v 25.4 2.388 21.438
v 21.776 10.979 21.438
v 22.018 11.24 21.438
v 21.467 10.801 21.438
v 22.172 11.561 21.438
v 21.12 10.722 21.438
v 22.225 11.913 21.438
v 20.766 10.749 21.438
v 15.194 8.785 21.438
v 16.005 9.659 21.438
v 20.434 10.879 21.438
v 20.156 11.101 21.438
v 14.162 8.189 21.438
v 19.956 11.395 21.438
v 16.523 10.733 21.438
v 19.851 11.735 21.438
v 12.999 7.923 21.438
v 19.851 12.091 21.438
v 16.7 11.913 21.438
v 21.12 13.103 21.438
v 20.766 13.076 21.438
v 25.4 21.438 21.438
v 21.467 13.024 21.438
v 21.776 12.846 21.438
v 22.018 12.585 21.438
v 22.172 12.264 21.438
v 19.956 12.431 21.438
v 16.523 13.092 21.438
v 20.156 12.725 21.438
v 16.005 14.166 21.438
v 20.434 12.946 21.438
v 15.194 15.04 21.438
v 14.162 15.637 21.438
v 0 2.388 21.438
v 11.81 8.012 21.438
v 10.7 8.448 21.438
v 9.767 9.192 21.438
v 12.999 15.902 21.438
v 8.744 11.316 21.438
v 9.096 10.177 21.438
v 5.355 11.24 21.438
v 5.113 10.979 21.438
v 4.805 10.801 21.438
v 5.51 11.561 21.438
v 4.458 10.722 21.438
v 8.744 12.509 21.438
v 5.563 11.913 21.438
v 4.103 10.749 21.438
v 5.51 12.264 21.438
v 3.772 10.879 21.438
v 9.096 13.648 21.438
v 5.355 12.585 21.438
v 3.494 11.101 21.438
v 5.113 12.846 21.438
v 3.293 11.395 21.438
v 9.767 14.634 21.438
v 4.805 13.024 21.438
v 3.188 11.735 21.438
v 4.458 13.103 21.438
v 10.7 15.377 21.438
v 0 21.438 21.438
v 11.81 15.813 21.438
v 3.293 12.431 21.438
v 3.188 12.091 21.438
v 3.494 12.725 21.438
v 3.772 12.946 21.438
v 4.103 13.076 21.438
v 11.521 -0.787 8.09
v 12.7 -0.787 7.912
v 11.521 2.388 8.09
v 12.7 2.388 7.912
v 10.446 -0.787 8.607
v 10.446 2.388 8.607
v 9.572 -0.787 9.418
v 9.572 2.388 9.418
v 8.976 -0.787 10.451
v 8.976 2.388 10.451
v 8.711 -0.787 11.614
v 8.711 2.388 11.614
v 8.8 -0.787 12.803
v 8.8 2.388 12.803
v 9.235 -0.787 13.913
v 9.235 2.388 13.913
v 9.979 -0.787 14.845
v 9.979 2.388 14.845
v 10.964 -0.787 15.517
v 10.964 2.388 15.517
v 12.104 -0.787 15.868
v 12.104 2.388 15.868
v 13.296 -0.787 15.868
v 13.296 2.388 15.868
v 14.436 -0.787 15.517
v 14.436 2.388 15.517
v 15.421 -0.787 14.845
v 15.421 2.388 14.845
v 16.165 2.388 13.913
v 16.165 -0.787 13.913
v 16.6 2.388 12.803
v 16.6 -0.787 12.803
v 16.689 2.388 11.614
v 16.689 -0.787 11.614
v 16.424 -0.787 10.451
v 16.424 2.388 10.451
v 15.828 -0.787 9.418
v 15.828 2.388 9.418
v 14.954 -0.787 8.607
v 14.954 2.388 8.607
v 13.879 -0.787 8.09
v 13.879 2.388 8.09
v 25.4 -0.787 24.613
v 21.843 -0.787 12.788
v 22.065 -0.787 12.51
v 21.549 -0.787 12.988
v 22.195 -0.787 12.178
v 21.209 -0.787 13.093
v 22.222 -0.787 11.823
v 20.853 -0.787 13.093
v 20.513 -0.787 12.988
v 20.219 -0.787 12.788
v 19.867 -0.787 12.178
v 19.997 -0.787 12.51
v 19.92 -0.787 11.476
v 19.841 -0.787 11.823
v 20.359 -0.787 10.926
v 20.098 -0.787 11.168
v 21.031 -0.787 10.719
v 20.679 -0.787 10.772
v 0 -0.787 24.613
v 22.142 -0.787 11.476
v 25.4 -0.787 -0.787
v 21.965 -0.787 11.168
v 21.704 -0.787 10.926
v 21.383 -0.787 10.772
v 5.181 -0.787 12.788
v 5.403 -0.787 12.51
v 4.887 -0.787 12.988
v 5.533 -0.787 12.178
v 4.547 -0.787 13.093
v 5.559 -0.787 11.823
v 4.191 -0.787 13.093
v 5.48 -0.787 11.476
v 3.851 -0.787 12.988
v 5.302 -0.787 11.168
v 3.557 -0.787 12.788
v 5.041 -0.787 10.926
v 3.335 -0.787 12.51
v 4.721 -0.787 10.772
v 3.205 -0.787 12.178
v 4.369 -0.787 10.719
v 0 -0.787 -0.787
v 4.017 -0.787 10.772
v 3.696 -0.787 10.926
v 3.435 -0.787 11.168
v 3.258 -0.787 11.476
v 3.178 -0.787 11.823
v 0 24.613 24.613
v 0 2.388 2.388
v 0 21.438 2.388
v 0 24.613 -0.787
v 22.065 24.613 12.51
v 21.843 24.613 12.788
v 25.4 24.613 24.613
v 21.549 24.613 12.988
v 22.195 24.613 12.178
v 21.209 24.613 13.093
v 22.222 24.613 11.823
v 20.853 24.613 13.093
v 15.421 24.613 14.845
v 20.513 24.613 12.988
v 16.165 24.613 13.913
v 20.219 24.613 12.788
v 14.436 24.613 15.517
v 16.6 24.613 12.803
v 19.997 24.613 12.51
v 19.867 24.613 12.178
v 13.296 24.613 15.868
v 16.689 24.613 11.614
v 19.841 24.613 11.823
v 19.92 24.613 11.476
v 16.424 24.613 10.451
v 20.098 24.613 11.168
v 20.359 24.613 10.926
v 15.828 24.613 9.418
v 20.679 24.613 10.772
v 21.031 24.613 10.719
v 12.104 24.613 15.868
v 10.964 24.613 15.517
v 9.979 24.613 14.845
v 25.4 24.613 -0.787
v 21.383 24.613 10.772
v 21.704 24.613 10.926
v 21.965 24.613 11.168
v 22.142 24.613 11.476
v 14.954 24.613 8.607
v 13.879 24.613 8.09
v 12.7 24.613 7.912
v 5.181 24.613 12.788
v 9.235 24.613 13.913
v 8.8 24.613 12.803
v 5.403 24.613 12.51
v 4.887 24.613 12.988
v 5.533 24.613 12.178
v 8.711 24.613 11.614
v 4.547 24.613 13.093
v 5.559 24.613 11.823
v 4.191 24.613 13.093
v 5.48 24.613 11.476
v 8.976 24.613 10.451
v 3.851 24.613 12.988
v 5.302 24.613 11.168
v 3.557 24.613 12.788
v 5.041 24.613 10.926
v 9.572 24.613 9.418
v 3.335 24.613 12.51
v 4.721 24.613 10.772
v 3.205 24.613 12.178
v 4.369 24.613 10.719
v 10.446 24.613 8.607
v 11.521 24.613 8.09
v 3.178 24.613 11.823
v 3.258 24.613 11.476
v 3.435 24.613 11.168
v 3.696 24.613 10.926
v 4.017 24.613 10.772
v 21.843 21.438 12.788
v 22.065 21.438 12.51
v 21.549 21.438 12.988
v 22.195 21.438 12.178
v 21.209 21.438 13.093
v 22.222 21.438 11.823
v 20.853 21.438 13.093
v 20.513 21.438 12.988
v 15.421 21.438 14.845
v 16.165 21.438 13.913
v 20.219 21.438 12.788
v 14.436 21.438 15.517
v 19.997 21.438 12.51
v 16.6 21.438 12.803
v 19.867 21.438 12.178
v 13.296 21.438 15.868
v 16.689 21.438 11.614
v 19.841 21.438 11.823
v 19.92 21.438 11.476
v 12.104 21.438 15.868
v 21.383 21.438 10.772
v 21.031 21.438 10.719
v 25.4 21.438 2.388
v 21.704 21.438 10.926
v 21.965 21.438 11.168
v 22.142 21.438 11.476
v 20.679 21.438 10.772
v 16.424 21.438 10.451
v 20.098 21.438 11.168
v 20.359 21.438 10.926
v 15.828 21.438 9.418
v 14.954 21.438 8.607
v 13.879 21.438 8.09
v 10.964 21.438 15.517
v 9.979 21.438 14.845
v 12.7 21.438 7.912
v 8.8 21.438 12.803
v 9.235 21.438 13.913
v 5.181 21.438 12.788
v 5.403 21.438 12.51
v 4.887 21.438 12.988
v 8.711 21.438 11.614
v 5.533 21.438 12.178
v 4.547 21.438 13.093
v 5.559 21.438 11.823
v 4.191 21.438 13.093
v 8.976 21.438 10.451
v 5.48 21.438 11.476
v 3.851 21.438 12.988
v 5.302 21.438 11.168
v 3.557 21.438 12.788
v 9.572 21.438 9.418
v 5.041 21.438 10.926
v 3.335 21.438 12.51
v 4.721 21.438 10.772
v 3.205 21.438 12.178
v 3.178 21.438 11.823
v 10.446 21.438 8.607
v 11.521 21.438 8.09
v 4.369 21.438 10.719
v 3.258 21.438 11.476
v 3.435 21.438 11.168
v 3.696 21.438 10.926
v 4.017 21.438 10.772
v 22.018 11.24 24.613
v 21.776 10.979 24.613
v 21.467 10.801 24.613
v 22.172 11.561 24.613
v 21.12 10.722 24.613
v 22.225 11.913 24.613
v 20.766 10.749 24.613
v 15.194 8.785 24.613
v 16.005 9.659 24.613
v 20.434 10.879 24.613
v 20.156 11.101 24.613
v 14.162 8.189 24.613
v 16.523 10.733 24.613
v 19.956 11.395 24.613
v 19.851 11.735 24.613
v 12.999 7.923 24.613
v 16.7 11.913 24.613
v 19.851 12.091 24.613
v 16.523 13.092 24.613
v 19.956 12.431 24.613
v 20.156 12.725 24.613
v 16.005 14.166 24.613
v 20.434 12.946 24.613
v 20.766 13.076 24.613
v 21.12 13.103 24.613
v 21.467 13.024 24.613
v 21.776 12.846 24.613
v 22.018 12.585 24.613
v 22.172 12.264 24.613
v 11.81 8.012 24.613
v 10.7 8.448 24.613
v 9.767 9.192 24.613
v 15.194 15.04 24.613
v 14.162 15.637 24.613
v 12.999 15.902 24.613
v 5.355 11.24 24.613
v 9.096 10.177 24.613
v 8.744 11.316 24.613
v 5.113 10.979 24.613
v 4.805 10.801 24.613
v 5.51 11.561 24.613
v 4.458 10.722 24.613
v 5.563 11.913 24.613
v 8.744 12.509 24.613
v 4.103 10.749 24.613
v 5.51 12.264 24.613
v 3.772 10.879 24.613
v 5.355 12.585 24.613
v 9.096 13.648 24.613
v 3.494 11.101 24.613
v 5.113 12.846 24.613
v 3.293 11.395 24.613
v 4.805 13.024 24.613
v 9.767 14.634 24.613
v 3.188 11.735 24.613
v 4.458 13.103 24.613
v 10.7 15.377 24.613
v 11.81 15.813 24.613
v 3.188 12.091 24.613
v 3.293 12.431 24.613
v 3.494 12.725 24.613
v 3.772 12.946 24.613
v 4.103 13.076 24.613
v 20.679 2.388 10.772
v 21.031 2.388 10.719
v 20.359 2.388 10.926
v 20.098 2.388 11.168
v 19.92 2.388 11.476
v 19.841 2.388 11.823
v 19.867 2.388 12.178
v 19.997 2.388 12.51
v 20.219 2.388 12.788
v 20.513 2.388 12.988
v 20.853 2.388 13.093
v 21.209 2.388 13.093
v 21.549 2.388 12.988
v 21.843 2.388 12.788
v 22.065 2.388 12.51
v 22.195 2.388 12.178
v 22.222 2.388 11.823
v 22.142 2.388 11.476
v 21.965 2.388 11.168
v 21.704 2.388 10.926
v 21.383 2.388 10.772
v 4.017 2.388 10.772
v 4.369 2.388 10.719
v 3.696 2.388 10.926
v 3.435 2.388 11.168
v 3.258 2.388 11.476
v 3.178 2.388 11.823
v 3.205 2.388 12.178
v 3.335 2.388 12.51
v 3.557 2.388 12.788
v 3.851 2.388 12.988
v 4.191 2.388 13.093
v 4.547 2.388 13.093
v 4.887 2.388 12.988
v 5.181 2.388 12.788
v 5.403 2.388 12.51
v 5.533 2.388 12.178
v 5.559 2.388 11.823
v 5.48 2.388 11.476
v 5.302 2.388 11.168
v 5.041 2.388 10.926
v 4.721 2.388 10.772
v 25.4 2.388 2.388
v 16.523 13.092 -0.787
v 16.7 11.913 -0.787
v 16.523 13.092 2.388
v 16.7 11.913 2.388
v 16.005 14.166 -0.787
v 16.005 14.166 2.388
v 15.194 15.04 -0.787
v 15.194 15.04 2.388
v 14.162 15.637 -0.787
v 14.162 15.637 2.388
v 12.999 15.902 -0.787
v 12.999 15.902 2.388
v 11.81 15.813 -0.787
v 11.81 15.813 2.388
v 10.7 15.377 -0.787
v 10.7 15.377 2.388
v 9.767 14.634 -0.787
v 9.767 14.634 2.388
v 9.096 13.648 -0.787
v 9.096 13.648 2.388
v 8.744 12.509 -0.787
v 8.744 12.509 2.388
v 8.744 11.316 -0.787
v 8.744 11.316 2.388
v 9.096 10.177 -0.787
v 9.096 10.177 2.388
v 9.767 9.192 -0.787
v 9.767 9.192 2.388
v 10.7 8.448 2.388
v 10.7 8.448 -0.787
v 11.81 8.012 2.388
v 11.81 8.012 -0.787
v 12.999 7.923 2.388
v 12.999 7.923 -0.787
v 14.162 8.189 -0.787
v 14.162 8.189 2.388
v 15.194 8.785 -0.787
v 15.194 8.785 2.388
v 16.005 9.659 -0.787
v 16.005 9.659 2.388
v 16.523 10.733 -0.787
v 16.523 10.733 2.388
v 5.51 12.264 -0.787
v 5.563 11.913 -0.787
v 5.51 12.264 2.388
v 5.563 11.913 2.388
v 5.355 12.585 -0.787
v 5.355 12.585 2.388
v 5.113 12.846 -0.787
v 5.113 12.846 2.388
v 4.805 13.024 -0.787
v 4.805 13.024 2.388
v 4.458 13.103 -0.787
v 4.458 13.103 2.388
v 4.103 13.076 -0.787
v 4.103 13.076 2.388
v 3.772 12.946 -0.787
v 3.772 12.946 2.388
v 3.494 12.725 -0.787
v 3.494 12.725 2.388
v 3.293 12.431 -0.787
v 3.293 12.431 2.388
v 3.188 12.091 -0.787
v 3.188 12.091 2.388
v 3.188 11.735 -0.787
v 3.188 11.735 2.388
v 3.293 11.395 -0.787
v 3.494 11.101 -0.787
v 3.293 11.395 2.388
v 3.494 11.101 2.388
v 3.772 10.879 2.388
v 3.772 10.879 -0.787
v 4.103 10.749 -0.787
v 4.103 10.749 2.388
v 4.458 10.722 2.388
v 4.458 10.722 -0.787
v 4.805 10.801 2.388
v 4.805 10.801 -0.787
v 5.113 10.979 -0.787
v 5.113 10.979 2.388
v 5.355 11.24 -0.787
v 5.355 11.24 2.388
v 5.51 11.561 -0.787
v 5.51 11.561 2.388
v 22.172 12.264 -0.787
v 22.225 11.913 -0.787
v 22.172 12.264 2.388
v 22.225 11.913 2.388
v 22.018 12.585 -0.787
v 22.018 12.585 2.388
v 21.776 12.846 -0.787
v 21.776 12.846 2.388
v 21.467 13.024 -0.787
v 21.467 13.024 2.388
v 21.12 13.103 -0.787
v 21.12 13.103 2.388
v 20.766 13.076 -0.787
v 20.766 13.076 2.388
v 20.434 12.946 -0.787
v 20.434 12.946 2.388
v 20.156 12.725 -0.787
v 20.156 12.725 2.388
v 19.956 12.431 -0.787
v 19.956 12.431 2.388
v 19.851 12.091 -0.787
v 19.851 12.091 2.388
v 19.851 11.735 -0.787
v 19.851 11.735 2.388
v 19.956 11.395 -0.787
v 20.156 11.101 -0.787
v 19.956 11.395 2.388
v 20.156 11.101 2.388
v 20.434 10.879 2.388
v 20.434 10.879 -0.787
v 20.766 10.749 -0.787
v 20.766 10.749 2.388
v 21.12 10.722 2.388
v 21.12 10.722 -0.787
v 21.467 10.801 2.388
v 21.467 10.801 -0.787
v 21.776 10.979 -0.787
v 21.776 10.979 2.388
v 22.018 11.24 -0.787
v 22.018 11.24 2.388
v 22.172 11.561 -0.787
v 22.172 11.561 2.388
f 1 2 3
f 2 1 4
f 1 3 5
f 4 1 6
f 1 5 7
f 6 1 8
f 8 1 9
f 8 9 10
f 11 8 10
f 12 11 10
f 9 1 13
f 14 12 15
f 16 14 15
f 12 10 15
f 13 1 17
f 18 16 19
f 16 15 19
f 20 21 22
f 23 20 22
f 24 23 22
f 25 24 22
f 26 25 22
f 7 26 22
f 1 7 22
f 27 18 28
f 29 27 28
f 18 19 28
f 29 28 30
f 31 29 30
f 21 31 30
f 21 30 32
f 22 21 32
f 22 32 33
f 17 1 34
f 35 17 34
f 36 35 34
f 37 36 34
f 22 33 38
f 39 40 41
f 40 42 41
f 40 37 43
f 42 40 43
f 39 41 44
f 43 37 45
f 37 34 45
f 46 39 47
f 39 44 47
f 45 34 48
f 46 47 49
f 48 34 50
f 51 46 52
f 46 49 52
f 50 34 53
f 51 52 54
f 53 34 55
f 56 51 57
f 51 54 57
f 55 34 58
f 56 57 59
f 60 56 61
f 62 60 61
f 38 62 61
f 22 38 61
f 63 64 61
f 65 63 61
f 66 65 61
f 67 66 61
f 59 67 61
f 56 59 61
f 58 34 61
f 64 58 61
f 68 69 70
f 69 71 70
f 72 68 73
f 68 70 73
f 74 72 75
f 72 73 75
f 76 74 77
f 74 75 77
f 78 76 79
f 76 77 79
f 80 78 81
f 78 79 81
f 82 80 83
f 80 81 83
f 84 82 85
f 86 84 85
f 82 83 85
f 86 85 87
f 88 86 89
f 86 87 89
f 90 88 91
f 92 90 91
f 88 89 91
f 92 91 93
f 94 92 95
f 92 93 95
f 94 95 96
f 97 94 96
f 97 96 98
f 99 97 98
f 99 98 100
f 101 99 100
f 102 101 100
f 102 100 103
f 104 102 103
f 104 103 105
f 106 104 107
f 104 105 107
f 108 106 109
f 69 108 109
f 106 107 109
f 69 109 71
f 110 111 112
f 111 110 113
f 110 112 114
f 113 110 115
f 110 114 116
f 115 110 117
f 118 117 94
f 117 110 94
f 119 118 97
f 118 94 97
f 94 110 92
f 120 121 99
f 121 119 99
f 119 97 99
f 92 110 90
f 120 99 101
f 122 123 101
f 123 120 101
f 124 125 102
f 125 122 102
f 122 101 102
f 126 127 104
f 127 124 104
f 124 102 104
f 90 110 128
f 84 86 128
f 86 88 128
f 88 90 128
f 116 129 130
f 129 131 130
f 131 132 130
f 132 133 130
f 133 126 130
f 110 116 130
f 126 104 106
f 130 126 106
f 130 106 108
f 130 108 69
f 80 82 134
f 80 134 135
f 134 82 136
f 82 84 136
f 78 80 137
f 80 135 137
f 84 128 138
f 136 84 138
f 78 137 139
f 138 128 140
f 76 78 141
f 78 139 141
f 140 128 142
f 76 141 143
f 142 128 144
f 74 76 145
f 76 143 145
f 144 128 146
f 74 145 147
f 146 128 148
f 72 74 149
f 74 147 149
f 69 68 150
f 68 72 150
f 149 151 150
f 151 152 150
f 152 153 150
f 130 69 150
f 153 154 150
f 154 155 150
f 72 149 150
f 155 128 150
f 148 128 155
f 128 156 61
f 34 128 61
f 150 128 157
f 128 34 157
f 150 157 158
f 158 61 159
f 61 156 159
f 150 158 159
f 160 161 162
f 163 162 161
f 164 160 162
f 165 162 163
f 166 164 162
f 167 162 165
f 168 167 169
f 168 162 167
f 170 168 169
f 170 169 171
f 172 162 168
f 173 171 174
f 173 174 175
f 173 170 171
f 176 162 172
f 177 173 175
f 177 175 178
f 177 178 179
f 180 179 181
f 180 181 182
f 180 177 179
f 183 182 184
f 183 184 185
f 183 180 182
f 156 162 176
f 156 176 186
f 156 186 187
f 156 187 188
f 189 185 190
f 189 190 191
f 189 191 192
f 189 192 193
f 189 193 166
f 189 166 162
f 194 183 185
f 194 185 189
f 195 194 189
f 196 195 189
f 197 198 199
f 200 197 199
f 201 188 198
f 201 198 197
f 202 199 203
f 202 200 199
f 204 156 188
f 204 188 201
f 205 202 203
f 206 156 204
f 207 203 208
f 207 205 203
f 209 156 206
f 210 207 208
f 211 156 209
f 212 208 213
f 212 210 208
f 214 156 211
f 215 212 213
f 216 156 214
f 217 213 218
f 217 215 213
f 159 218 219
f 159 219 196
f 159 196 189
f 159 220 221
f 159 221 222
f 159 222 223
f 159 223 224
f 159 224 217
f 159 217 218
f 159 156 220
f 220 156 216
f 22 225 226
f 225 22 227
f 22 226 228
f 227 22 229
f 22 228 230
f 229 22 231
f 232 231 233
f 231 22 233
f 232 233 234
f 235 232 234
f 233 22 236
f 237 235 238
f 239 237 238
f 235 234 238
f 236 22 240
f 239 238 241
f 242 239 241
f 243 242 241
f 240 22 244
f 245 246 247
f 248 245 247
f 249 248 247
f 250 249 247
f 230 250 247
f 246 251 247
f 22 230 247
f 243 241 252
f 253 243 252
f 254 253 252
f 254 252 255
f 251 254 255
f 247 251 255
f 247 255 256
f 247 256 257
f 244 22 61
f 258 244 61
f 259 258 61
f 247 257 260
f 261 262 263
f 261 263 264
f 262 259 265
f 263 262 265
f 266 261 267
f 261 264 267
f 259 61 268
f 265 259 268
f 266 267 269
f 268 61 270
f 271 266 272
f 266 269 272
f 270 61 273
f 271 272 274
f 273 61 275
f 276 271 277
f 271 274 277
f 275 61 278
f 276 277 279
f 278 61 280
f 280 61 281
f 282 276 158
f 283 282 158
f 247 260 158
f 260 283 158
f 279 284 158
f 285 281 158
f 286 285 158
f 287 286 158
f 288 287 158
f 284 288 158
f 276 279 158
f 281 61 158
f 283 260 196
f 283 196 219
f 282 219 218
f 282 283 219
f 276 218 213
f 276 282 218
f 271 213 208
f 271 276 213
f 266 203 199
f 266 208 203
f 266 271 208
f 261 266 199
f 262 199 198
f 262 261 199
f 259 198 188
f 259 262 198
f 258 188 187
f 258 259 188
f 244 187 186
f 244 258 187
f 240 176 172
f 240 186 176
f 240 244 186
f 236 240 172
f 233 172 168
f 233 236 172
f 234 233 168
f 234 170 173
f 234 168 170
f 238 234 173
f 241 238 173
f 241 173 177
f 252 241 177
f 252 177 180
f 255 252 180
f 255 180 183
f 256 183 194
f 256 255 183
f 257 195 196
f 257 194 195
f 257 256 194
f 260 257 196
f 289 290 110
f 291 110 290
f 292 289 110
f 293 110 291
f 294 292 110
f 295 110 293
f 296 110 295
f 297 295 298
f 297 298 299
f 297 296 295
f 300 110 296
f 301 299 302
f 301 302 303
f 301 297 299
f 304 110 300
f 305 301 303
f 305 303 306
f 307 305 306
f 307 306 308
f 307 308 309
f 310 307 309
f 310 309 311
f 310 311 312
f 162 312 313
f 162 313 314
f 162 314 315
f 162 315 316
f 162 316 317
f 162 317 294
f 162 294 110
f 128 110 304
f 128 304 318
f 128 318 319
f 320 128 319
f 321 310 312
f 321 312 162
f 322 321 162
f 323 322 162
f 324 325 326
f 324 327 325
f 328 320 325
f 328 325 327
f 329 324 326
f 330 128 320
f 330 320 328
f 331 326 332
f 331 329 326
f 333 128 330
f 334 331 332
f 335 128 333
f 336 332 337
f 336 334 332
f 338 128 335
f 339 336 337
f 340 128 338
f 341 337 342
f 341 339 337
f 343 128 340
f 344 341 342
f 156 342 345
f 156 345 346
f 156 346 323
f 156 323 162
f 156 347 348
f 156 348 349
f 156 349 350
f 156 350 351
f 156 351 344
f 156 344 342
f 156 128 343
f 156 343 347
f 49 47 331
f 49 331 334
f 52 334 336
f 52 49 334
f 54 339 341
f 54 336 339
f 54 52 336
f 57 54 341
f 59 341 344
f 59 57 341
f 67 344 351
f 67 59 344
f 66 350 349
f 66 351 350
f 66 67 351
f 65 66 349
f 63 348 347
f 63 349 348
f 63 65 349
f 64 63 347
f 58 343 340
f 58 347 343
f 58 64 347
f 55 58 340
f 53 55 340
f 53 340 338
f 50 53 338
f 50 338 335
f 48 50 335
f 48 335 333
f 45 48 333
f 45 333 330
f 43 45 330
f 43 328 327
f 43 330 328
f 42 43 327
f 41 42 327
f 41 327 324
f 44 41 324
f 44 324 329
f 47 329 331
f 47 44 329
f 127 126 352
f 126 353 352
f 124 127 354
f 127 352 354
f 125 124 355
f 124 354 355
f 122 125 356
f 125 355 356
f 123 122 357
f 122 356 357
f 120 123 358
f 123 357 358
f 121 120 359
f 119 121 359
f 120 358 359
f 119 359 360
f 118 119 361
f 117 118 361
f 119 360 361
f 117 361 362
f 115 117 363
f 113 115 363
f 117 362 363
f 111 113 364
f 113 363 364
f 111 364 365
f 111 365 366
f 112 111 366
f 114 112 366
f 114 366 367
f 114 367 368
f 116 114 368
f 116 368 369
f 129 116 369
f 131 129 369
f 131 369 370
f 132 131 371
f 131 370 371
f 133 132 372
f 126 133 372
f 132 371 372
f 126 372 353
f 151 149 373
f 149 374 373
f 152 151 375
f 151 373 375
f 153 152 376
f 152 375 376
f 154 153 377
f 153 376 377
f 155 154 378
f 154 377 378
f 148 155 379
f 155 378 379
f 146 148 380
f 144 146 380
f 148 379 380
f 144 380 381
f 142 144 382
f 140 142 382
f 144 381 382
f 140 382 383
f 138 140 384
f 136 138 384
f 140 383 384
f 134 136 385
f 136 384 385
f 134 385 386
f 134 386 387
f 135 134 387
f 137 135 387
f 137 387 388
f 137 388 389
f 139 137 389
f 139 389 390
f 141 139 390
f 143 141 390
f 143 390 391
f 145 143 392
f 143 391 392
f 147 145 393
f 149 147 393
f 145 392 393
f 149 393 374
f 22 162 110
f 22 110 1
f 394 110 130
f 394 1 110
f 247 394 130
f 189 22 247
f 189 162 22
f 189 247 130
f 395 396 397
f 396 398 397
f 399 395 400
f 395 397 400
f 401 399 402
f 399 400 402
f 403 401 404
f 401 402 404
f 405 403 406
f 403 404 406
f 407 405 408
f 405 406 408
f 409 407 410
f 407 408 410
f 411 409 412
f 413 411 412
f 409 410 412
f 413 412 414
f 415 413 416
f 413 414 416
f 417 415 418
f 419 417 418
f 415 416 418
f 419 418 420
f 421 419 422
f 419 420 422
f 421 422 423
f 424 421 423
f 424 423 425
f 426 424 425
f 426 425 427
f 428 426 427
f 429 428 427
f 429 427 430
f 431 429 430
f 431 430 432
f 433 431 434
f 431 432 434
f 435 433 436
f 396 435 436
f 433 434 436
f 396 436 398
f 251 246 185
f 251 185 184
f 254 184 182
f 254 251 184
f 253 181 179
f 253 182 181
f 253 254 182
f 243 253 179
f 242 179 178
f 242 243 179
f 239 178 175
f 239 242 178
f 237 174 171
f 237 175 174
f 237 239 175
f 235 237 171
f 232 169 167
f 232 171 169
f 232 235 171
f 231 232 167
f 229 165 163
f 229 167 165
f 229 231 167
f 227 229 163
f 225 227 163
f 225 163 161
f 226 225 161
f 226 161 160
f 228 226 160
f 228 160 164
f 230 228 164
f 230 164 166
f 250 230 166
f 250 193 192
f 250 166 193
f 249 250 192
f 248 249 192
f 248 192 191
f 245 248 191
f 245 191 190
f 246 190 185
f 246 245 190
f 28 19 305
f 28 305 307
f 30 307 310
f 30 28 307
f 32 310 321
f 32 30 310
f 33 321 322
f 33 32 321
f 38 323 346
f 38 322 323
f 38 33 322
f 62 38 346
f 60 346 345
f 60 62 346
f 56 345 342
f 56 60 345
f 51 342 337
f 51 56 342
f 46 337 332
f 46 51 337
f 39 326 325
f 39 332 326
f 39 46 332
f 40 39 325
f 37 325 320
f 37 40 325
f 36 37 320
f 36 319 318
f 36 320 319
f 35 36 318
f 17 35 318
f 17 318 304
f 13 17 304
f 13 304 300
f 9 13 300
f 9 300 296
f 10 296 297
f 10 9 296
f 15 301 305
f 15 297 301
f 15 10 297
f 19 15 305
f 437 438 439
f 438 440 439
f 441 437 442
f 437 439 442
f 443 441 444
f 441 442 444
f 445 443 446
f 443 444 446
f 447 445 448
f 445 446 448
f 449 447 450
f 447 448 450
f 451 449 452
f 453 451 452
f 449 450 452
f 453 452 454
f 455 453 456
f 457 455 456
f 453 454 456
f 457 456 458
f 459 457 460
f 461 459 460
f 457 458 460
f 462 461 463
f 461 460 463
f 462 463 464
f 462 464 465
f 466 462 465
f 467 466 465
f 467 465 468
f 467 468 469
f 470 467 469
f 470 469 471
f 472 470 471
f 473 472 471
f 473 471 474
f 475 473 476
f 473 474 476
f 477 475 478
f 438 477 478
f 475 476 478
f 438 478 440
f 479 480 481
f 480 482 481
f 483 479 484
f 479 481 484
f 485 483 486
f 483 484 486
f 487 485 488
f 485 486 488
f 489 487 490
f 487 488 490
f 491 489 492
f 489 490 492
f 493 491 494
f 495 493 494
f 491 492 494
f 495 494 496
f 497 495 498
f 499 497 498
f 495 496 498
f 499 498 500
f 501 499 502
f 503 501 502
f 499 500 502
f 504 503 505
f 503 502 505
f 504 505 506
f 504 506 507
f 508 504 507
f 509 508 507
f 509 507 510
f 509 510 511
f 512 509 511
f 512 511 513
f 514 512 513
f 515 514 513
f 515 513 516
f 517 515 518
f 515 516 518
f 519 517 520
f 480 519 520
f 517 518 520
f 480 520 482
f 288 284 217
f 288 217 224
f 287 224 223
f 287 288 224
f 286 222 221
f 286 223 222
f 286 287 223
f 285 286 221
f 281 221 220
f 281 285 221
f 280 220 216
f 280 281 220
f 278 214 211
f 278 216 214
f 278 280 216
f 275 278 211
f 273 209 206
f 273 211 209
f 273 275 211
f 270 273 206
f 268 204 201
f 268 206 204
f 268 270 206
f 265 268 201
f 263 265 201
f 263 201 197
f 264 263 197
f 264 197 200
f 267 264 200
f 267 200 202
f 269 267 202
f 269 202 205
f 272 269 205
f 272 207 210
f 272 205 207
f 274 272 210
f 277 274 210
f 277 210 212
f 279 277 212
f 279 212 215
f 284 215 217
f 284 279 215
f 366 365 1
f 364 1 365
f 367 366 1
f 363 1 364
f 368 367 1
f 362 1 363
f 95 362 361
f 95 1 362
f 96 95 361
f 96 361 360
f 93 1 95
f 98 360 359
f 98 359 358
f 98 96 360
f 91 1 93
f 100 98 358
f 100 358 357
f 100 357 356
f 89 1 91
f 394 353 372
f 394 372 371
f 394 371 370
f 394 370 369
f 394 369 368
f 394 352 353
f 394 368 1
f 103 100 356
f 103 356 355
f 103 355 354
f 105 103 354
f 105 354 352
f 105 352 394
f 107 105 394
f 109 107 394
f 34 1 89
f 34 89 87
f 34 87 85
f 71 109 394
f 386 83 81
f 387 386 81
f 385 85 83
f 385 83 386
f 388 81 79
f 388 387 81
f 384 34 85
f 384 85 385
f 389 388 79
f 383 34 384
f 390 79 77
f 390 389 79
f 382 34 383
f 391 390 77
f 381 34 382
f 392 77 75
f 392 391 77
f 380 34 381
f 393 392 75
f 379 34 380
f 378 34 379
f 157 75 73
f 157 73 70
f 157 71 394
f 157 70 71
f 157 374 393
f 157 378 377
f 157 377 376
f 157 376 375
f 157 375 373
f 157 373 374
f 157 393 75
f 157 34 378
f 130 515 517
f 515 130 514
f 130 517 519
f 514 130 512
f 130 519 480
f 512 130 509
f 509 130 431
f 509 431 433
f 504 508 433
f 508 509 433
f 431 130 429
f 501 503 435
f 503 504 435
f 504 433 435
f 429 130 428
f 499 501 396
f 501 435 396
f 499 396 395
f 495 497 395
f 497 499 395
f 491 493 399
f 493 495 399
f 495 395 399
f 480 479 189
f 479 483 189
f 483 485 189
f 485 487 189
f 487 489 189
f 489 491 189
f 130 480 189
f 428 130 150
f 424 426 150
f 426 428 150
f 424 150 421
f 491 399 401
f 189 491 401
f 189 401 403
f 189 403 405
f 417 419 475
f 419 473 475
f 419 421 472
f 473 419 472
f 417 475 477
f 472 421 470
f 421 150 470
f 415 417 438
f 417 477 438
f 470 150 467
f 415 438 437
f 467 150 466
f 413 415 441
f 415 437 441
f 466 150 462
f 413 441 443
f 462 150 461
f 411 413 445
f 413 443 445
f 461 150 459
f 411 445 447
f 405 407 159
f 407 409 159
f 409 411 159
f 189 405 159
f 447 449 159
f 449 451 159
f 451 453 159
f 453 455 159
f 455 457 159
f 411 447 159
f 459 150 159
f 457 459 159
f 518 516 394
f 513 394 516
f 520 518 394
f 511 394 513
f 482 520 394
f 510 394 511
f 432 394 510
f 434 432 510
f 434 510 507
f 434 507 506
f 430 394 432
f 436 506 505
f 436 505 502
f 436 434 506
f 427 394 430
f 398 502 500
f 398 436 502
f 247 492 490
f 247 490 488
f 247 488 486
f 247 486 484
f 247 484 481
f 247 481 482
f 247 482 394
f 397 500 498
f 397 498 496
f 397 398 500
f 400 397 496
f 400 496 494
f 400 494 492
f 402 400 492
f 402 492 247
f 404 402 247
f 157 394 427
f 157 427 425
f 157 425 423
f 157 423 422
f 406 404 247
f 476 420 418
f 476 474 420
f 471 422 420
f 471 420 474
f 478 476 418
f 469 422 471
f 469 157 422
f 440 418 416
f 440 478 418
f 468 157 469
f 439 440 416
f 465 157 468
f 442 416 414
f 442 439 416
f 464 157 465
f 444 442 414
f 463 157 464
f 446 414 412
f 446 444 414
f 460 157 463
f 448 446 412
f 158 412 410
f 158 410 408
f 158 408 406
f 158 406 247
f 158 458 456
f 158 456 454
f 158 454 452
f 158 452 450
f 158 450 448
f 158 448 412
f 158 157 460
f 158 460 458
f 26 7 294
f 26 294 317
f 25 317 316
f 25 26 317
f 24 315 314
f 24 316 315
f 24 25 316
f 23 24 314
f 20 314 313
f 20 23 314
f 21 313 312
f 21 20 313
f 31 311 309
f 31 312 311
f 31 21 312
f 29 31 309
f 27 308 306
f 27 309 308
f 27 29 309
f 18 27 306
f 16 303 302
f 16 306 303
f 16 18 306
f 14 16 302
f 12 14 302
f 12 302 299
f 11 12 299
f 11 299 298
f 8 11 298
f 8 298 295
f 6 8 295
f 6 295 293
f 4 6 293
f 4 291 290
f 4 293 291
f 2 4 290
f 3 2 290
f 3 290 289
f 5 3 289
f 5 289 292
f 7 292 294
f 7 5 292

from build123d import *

# Parameters (mm, degrees)
SKETCH1_W               = 25.4
SKETCH1_H               = 25.4
SKETCH1_W_2             = 19.05
SKETCH1_H_2             = 19.05
EXTRUDE1_DEPTH          = 25.4
SKETCH3_R               = 4.0005
SKETCH3_R_2             = 1.1938
CUT_EXTRUDE1_DEPTH      = 25.6126
CUT_EXTRUDE1_DEPTH_BACK = 25.4
SKETCH2_R               = 1.1938
SKETCH2_R_2             = 4.0005
CUT_EXTRUDE2_DEPTH      = 25.6126
CUT_EXTRUDE2_DEPTH_BACK = 25.4


with BuildPart() as part:
    # Sketch1 → Extrude1 (new body)
    with BuildSketch(Plane(origin=(0, 0, 0), x_dir=(0, 0, -1), z_dir=(1, 0, 0))):
        with Locations((-11.9126, 11.9126)):
            Rectangle(SKETCH1_W, SKETCH1_H)
        with Locations((-11.9126, 11.9126)):
            Rectangle(SKETCH1_W_2, SKETCH1_H_2, mode=Mode.SUBTRACT)
    extrude(amount=EXTRUDE1_DEPTH)

    # Sketch3 → Cut-Extrude1 (cut, two sides)
    with BuildSketch(Plane(origin=(0, 0, 0), x_dir=(1, 0, 0), z_dir=(0, 1, 0))) as cut_extrude1_sk:
        with Locations(Location((12.7, -11.9126, 0), (0, 0, 90))):  # turned: the seam where the file's is
            Circle(SKETCH3_R)
        with Locations(Location((4.3688, -11.9126, 0), (0, 0, 90))):  # turned: the seam where the file's is
            Circle(SKETCH3_R_2)
        with Locations(Location((21.0312, -11.9126, 0), (0, 0, 90))):  # turned: the seam where the file's is
            Circle(SKETCH3_R_2)
    extrude(amount=CUT_EXTRUDE1_DEPTH, mode=Mode.SUBTRACT)
    extrude(cut_extrude1_sk.sketch, amount=-CUT_EXTRUDE1_DEPTH_BACK, mode=Mode.SUBTRACT)

    # Sketch2 → Cut-Extrude2 (cut, two sides)
    with BuildSketch(Plane.XY) as cut_extrude2_sk:
        with Locations((4.3688, 11.9126)):
            Circle(SKETCH2_R)
        with Locations((21.0312, 11.9126)):
            Circle(SKETCH2_R)
        with Locations((12.7, 11.9126)):
            Circle(SKETCH2_R_2)
    extrude(amount=CUT_EXTRUDE2_DEPTH, mode=Mode.SUBTRACT)
    extrude(cut_extrude2_sk.sketch, amount=-CUT_EXTRUDE2_DEPTH_BACK, mode=Mode.SUBTRACT)


solid = part.part
